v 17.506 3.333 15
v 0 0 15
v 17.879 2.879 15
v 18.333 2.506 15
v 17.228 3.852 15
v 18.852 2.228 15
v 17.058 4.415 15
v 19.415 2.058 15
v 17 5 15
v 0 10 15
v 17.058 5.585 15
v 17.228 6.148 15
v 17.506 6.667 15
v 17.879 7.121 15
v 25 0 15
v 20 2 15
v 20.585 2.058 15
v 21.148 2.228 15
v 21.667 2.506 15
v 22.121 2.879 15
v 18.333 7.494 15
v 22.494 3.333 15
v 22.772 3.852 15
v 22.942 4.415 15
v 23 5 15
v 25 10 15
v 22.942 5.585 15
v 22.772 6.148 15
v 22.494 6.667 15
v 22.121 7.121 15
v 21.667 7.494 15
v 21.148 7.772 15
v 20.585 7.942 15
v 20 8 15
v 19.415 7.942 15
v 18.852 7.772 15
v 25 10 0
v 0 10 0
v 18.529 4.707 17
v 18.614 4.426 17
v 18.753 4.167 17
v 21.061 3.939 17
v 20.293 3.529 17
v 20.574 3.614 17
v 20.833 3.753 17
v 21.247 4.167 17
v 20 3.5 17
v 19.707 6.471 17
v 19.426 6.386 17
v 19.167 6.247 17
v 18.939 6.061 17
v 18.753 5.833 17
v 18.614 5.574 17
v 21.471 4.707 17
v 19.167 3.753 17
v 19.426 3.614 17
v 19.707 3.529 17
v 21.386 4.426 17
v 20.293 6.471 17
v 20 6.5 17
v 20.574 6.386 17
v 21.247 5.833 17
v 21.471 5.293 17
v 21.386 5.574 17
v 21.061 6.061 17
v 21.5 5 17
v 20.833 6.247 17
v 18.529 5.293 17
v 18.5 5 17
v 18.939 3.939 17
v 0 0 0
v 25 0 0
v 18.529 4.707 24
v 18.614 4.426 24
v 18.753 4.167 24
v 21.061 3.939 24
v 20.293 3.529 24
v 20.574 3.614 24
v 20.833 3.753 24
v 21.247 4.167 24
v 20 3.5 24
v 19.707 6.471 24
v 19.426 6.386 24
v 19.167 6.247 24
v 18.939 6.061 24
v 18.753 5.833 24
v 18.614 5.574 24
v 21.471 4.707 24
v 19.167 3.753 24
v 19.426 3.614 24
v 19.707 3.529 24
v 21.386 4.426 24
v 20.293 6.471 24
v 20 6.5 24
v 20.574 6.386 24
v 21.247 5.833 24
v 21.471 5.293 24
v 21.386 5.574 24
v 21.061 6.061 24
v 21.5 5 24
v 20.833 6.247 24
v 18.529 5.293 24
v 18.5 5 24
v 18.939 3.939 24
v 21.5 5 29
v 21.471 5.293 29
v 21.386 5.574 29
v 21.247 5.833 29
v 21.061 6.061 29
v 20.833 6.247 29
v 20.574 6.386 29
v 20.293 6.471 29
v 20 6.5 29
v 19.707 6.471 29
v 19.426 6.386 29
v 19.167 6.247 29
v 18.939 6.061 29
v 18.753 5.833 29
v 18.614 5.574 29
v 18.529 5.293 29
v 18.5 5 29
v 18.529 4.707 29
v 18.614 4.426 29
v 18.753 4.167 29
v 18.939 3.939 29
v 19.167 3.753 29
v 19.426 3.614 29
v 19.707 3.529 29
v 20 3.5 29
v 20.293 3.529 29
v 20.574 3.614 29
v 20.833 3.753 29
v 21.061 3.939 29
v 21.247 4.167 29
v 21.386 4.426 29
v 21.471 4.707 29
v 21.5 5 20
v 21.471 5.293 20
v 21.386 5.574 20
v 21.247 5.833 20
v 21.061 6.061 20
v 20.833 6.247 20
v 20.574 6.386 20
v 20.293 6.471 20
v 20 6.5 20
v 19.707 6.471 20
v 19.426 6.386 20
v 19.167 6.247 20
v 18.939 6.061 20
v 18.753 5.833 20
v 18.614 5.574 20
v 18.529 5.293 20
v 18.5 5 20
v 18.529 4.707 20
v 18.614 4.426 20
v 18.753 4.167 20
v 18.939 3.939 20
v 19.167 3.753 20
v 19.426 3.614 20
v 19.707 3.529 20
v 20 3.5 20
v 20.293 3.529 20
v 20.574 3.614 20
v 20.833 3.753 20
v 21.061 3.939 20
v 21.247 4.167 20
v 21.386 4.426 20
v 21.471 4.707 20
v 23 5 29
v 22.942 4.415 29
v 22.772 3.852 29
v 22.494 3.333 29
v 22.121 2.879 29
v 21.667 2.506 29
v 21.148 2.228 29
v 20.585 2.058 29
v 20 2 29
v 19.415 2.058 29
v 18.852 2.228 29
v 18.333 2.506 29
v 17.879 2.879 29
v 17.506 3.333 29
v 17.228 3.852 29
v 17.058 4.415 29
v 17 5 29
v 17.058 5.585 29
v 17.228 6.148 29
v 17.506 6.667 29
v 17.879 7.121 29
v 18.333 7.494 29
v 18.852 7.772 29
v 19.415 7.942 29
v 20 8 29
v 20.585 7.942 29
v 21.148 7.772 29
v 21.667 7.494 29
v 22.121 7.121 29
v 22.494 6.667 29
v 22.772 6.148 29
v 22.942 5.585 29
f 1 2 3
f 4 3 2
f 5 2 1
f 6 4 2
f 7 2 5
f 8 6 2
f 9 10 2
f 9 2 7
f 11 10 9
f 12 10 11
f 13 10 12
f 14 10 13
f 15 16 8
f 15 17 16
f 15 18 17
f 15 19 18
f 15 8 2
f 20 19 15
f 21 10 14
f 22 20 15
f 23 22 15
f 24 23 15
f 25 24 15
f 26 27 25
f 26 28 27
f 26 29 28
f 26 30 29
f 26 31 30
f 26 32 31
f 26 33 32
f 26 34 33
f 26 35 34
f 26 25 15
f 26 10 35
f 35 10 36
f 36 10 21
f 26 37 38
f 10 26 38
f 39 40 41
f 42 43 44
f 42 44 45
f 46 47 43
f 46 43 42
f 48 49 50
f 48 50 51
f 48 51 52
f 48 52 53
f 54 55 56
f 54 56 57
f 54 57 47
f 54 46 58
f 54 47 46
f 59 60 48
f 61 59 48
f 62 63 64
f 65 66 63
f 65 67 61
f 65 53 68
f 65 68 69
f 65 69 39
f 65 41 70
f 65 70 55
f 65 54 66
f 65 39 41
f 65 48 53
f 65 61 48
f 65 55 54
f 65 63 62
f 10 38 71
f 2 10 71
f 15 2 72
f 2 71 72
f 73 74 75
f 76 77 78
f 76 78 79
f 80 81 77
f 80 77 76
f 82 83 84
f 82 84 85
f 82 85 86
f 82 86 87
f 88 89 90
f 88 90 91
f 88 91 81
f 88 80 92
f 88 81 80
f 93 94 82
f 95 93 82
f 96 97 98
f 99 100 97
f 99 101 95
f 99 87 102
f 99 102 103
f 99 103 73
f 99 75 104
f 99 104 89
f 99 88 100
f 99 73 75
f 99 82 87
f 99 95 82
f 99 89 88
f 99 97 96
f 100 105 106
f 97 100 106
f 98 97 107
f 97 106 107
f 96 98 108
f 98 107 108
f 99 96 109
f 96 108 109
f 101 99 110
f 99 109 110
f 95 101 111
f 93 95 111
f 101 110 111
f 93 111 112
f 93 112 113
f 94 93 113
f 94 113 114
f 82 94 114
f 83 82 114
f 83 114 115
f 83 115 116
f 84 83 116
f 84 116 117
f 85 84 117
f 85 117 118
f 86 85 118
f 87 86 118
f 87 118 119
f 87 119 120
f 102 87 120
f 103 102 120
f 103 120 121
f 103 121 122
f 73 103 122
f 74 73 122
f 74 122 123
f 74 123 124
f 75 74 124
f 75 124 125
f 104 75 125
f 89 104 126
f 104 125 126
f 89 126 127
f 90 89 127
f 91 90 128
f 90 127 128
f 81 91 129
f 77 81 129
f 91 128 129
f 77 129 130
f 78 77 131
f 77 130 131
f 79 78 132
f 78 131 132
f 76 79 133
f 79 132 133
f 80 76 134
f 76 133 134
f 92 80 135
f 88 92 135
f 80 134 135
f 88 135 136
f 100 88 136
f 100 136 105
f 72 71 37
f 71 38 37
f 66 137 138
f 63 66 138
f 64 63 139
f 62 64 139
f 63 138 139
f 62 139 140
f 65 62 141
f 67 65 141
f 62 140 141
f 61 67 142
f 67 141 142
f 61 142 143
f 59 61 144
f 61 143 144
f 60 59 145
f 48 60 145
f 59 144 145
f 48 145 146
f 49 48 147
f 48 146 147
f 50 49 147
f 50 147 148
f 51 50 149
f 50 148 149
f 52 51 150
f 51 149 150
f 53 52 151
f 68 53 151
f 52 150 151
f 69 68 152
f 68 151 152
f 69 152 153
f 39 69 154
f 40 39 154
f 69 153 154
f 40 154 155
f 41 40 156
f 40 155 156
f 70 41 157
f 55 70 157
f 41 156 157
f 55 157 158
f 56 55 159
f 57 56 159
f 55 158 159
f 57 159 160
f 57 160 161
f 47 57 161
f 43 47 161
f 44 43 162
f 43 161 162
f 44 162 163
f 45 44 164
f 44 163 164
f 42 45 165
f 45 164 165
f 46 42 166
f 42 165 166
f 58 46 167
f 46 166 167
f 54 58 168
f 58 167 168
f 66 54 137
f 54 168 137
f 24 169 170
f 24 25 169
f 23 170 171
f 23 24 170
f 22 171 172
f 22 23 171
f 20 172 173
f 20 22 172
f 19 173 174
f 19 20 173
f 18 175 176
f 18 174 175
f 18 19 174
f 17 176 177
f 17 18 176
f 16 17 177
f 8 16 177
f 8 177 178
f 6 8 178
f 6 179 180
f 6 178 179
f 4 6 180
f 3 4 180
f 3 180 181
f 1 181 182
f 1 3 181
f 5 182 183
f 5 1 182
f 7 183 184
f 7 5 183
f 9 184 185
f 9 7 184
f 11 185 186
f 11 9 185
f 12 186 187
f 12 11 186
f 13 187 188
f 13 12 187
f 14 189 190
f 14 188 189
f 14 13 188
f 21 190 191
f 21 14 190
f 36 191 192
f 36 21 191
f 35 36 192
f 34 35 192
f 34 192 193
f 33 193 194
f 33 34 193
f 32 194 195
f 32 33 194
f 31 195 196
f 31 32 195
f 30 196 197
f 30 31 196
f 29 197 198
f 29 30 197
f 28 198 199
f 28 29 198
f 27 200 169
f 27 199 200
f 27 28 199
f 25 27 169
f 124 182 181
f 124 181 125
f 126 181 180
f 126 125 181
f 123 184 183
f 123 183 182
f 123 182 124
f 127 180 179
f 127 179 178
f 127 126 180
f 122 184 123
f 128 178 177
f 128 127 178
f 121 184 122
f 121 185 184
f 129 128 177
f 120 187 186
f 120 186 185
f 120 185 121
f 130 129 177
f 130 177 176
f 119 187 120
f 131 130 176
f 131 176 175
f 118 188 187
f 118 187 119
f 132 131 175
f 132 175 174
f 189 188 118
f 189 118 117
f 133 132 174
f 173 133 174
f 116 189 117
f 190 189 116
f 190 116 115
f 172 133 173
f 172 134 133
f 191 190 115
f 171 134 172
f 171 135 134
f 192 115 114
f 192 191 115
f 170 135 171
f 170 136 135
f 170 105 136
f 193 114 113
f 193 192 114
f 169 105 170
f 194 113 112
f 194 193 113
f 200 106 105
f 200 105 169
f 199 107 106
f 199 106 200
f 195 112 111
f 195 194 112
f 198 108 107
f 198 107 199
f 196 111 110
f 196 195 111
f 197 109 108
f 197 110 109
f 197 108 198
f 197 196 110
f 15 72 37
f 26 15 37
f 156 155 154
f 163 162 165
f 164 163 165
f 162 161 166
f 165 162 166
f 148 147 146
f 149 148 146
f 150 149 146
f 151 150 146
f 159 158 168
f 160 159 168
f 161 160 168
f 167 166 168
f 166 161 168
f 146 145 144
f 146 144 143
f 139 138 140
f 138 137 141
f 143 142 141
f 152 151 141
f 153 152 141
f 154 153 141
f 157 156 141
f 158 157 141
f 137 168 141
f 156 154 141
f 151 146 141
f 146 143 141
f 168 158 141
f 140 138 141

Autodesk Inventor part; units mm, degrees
ref_plane "YZ Plane" through (0, 0, 0) normal (1, 0, 0) x (0, 1, 0)
ref_plane "XZ Plane" through (0, 0, 0) normal (0, 1, 0) x (-1, 0, 0)
ref_plane "XY Plane" through (0, 0, 0) normal (0, 0, 1) x (1, 0, 0)
sketch "Sketch1" plane through (0, 0, 0) normal (0, 0, 1) x (1, 0, 0)
  line L0 (0, 0) -> (25, 0)
  line L1 (25, 0) -> (25, 10)
  line L2 (25, 10) -> (0, 10)
  line L3 (0, 10) -> (0, 0)
  dimension "d0" = 25
  dimension "d1" = 10
extrude "Extrusion1" add sketch "Sketch1" along normal blind 15
sketch "Sketch2" plane through (0, 0, 15) normal (0, 0, 1) x (1, 0, 0)
  circle A0 centre (20, 5) radius 3
  point P0 (0, 0)
  dimension "d4" = 6
extrude "Extrusion2" add sketch "Sketch2" along normal blind 5
sketch "Sketch3" plane through (20, 5, 20) normal (0, 0, 1) x (1, 0, 0)
  circle A0 centre (0, 0) radius 1.5
  point P0 (-20, -5)
  dimension "d7" = 3
extrude "Extrusion3" cut sketch "Sketch3" against normal blind 3
sketch "Sketch4" plane through (20, 5, 20) normal (0, 0, 1) x (1, 0, 0)
  circle A0 centre (0, 0) radius 3
  point P0 (-20, -5)
extrude "Extrusion4" add sketch "Sketch4" along normal blind 9
sketch "Sketch5" plane through (20, 5, 29) normal (0, 0, 1) x (1, 0, 0)
  circle A0 centre (0, 0) radius 1.5 projected
  circle A1 centre (0, 0) radius 1.5
  point P0 (-20, -5)
extrude "Extrusion5" cut sketch "Sketch5" against normal blind 5
properties part number "servo part"
